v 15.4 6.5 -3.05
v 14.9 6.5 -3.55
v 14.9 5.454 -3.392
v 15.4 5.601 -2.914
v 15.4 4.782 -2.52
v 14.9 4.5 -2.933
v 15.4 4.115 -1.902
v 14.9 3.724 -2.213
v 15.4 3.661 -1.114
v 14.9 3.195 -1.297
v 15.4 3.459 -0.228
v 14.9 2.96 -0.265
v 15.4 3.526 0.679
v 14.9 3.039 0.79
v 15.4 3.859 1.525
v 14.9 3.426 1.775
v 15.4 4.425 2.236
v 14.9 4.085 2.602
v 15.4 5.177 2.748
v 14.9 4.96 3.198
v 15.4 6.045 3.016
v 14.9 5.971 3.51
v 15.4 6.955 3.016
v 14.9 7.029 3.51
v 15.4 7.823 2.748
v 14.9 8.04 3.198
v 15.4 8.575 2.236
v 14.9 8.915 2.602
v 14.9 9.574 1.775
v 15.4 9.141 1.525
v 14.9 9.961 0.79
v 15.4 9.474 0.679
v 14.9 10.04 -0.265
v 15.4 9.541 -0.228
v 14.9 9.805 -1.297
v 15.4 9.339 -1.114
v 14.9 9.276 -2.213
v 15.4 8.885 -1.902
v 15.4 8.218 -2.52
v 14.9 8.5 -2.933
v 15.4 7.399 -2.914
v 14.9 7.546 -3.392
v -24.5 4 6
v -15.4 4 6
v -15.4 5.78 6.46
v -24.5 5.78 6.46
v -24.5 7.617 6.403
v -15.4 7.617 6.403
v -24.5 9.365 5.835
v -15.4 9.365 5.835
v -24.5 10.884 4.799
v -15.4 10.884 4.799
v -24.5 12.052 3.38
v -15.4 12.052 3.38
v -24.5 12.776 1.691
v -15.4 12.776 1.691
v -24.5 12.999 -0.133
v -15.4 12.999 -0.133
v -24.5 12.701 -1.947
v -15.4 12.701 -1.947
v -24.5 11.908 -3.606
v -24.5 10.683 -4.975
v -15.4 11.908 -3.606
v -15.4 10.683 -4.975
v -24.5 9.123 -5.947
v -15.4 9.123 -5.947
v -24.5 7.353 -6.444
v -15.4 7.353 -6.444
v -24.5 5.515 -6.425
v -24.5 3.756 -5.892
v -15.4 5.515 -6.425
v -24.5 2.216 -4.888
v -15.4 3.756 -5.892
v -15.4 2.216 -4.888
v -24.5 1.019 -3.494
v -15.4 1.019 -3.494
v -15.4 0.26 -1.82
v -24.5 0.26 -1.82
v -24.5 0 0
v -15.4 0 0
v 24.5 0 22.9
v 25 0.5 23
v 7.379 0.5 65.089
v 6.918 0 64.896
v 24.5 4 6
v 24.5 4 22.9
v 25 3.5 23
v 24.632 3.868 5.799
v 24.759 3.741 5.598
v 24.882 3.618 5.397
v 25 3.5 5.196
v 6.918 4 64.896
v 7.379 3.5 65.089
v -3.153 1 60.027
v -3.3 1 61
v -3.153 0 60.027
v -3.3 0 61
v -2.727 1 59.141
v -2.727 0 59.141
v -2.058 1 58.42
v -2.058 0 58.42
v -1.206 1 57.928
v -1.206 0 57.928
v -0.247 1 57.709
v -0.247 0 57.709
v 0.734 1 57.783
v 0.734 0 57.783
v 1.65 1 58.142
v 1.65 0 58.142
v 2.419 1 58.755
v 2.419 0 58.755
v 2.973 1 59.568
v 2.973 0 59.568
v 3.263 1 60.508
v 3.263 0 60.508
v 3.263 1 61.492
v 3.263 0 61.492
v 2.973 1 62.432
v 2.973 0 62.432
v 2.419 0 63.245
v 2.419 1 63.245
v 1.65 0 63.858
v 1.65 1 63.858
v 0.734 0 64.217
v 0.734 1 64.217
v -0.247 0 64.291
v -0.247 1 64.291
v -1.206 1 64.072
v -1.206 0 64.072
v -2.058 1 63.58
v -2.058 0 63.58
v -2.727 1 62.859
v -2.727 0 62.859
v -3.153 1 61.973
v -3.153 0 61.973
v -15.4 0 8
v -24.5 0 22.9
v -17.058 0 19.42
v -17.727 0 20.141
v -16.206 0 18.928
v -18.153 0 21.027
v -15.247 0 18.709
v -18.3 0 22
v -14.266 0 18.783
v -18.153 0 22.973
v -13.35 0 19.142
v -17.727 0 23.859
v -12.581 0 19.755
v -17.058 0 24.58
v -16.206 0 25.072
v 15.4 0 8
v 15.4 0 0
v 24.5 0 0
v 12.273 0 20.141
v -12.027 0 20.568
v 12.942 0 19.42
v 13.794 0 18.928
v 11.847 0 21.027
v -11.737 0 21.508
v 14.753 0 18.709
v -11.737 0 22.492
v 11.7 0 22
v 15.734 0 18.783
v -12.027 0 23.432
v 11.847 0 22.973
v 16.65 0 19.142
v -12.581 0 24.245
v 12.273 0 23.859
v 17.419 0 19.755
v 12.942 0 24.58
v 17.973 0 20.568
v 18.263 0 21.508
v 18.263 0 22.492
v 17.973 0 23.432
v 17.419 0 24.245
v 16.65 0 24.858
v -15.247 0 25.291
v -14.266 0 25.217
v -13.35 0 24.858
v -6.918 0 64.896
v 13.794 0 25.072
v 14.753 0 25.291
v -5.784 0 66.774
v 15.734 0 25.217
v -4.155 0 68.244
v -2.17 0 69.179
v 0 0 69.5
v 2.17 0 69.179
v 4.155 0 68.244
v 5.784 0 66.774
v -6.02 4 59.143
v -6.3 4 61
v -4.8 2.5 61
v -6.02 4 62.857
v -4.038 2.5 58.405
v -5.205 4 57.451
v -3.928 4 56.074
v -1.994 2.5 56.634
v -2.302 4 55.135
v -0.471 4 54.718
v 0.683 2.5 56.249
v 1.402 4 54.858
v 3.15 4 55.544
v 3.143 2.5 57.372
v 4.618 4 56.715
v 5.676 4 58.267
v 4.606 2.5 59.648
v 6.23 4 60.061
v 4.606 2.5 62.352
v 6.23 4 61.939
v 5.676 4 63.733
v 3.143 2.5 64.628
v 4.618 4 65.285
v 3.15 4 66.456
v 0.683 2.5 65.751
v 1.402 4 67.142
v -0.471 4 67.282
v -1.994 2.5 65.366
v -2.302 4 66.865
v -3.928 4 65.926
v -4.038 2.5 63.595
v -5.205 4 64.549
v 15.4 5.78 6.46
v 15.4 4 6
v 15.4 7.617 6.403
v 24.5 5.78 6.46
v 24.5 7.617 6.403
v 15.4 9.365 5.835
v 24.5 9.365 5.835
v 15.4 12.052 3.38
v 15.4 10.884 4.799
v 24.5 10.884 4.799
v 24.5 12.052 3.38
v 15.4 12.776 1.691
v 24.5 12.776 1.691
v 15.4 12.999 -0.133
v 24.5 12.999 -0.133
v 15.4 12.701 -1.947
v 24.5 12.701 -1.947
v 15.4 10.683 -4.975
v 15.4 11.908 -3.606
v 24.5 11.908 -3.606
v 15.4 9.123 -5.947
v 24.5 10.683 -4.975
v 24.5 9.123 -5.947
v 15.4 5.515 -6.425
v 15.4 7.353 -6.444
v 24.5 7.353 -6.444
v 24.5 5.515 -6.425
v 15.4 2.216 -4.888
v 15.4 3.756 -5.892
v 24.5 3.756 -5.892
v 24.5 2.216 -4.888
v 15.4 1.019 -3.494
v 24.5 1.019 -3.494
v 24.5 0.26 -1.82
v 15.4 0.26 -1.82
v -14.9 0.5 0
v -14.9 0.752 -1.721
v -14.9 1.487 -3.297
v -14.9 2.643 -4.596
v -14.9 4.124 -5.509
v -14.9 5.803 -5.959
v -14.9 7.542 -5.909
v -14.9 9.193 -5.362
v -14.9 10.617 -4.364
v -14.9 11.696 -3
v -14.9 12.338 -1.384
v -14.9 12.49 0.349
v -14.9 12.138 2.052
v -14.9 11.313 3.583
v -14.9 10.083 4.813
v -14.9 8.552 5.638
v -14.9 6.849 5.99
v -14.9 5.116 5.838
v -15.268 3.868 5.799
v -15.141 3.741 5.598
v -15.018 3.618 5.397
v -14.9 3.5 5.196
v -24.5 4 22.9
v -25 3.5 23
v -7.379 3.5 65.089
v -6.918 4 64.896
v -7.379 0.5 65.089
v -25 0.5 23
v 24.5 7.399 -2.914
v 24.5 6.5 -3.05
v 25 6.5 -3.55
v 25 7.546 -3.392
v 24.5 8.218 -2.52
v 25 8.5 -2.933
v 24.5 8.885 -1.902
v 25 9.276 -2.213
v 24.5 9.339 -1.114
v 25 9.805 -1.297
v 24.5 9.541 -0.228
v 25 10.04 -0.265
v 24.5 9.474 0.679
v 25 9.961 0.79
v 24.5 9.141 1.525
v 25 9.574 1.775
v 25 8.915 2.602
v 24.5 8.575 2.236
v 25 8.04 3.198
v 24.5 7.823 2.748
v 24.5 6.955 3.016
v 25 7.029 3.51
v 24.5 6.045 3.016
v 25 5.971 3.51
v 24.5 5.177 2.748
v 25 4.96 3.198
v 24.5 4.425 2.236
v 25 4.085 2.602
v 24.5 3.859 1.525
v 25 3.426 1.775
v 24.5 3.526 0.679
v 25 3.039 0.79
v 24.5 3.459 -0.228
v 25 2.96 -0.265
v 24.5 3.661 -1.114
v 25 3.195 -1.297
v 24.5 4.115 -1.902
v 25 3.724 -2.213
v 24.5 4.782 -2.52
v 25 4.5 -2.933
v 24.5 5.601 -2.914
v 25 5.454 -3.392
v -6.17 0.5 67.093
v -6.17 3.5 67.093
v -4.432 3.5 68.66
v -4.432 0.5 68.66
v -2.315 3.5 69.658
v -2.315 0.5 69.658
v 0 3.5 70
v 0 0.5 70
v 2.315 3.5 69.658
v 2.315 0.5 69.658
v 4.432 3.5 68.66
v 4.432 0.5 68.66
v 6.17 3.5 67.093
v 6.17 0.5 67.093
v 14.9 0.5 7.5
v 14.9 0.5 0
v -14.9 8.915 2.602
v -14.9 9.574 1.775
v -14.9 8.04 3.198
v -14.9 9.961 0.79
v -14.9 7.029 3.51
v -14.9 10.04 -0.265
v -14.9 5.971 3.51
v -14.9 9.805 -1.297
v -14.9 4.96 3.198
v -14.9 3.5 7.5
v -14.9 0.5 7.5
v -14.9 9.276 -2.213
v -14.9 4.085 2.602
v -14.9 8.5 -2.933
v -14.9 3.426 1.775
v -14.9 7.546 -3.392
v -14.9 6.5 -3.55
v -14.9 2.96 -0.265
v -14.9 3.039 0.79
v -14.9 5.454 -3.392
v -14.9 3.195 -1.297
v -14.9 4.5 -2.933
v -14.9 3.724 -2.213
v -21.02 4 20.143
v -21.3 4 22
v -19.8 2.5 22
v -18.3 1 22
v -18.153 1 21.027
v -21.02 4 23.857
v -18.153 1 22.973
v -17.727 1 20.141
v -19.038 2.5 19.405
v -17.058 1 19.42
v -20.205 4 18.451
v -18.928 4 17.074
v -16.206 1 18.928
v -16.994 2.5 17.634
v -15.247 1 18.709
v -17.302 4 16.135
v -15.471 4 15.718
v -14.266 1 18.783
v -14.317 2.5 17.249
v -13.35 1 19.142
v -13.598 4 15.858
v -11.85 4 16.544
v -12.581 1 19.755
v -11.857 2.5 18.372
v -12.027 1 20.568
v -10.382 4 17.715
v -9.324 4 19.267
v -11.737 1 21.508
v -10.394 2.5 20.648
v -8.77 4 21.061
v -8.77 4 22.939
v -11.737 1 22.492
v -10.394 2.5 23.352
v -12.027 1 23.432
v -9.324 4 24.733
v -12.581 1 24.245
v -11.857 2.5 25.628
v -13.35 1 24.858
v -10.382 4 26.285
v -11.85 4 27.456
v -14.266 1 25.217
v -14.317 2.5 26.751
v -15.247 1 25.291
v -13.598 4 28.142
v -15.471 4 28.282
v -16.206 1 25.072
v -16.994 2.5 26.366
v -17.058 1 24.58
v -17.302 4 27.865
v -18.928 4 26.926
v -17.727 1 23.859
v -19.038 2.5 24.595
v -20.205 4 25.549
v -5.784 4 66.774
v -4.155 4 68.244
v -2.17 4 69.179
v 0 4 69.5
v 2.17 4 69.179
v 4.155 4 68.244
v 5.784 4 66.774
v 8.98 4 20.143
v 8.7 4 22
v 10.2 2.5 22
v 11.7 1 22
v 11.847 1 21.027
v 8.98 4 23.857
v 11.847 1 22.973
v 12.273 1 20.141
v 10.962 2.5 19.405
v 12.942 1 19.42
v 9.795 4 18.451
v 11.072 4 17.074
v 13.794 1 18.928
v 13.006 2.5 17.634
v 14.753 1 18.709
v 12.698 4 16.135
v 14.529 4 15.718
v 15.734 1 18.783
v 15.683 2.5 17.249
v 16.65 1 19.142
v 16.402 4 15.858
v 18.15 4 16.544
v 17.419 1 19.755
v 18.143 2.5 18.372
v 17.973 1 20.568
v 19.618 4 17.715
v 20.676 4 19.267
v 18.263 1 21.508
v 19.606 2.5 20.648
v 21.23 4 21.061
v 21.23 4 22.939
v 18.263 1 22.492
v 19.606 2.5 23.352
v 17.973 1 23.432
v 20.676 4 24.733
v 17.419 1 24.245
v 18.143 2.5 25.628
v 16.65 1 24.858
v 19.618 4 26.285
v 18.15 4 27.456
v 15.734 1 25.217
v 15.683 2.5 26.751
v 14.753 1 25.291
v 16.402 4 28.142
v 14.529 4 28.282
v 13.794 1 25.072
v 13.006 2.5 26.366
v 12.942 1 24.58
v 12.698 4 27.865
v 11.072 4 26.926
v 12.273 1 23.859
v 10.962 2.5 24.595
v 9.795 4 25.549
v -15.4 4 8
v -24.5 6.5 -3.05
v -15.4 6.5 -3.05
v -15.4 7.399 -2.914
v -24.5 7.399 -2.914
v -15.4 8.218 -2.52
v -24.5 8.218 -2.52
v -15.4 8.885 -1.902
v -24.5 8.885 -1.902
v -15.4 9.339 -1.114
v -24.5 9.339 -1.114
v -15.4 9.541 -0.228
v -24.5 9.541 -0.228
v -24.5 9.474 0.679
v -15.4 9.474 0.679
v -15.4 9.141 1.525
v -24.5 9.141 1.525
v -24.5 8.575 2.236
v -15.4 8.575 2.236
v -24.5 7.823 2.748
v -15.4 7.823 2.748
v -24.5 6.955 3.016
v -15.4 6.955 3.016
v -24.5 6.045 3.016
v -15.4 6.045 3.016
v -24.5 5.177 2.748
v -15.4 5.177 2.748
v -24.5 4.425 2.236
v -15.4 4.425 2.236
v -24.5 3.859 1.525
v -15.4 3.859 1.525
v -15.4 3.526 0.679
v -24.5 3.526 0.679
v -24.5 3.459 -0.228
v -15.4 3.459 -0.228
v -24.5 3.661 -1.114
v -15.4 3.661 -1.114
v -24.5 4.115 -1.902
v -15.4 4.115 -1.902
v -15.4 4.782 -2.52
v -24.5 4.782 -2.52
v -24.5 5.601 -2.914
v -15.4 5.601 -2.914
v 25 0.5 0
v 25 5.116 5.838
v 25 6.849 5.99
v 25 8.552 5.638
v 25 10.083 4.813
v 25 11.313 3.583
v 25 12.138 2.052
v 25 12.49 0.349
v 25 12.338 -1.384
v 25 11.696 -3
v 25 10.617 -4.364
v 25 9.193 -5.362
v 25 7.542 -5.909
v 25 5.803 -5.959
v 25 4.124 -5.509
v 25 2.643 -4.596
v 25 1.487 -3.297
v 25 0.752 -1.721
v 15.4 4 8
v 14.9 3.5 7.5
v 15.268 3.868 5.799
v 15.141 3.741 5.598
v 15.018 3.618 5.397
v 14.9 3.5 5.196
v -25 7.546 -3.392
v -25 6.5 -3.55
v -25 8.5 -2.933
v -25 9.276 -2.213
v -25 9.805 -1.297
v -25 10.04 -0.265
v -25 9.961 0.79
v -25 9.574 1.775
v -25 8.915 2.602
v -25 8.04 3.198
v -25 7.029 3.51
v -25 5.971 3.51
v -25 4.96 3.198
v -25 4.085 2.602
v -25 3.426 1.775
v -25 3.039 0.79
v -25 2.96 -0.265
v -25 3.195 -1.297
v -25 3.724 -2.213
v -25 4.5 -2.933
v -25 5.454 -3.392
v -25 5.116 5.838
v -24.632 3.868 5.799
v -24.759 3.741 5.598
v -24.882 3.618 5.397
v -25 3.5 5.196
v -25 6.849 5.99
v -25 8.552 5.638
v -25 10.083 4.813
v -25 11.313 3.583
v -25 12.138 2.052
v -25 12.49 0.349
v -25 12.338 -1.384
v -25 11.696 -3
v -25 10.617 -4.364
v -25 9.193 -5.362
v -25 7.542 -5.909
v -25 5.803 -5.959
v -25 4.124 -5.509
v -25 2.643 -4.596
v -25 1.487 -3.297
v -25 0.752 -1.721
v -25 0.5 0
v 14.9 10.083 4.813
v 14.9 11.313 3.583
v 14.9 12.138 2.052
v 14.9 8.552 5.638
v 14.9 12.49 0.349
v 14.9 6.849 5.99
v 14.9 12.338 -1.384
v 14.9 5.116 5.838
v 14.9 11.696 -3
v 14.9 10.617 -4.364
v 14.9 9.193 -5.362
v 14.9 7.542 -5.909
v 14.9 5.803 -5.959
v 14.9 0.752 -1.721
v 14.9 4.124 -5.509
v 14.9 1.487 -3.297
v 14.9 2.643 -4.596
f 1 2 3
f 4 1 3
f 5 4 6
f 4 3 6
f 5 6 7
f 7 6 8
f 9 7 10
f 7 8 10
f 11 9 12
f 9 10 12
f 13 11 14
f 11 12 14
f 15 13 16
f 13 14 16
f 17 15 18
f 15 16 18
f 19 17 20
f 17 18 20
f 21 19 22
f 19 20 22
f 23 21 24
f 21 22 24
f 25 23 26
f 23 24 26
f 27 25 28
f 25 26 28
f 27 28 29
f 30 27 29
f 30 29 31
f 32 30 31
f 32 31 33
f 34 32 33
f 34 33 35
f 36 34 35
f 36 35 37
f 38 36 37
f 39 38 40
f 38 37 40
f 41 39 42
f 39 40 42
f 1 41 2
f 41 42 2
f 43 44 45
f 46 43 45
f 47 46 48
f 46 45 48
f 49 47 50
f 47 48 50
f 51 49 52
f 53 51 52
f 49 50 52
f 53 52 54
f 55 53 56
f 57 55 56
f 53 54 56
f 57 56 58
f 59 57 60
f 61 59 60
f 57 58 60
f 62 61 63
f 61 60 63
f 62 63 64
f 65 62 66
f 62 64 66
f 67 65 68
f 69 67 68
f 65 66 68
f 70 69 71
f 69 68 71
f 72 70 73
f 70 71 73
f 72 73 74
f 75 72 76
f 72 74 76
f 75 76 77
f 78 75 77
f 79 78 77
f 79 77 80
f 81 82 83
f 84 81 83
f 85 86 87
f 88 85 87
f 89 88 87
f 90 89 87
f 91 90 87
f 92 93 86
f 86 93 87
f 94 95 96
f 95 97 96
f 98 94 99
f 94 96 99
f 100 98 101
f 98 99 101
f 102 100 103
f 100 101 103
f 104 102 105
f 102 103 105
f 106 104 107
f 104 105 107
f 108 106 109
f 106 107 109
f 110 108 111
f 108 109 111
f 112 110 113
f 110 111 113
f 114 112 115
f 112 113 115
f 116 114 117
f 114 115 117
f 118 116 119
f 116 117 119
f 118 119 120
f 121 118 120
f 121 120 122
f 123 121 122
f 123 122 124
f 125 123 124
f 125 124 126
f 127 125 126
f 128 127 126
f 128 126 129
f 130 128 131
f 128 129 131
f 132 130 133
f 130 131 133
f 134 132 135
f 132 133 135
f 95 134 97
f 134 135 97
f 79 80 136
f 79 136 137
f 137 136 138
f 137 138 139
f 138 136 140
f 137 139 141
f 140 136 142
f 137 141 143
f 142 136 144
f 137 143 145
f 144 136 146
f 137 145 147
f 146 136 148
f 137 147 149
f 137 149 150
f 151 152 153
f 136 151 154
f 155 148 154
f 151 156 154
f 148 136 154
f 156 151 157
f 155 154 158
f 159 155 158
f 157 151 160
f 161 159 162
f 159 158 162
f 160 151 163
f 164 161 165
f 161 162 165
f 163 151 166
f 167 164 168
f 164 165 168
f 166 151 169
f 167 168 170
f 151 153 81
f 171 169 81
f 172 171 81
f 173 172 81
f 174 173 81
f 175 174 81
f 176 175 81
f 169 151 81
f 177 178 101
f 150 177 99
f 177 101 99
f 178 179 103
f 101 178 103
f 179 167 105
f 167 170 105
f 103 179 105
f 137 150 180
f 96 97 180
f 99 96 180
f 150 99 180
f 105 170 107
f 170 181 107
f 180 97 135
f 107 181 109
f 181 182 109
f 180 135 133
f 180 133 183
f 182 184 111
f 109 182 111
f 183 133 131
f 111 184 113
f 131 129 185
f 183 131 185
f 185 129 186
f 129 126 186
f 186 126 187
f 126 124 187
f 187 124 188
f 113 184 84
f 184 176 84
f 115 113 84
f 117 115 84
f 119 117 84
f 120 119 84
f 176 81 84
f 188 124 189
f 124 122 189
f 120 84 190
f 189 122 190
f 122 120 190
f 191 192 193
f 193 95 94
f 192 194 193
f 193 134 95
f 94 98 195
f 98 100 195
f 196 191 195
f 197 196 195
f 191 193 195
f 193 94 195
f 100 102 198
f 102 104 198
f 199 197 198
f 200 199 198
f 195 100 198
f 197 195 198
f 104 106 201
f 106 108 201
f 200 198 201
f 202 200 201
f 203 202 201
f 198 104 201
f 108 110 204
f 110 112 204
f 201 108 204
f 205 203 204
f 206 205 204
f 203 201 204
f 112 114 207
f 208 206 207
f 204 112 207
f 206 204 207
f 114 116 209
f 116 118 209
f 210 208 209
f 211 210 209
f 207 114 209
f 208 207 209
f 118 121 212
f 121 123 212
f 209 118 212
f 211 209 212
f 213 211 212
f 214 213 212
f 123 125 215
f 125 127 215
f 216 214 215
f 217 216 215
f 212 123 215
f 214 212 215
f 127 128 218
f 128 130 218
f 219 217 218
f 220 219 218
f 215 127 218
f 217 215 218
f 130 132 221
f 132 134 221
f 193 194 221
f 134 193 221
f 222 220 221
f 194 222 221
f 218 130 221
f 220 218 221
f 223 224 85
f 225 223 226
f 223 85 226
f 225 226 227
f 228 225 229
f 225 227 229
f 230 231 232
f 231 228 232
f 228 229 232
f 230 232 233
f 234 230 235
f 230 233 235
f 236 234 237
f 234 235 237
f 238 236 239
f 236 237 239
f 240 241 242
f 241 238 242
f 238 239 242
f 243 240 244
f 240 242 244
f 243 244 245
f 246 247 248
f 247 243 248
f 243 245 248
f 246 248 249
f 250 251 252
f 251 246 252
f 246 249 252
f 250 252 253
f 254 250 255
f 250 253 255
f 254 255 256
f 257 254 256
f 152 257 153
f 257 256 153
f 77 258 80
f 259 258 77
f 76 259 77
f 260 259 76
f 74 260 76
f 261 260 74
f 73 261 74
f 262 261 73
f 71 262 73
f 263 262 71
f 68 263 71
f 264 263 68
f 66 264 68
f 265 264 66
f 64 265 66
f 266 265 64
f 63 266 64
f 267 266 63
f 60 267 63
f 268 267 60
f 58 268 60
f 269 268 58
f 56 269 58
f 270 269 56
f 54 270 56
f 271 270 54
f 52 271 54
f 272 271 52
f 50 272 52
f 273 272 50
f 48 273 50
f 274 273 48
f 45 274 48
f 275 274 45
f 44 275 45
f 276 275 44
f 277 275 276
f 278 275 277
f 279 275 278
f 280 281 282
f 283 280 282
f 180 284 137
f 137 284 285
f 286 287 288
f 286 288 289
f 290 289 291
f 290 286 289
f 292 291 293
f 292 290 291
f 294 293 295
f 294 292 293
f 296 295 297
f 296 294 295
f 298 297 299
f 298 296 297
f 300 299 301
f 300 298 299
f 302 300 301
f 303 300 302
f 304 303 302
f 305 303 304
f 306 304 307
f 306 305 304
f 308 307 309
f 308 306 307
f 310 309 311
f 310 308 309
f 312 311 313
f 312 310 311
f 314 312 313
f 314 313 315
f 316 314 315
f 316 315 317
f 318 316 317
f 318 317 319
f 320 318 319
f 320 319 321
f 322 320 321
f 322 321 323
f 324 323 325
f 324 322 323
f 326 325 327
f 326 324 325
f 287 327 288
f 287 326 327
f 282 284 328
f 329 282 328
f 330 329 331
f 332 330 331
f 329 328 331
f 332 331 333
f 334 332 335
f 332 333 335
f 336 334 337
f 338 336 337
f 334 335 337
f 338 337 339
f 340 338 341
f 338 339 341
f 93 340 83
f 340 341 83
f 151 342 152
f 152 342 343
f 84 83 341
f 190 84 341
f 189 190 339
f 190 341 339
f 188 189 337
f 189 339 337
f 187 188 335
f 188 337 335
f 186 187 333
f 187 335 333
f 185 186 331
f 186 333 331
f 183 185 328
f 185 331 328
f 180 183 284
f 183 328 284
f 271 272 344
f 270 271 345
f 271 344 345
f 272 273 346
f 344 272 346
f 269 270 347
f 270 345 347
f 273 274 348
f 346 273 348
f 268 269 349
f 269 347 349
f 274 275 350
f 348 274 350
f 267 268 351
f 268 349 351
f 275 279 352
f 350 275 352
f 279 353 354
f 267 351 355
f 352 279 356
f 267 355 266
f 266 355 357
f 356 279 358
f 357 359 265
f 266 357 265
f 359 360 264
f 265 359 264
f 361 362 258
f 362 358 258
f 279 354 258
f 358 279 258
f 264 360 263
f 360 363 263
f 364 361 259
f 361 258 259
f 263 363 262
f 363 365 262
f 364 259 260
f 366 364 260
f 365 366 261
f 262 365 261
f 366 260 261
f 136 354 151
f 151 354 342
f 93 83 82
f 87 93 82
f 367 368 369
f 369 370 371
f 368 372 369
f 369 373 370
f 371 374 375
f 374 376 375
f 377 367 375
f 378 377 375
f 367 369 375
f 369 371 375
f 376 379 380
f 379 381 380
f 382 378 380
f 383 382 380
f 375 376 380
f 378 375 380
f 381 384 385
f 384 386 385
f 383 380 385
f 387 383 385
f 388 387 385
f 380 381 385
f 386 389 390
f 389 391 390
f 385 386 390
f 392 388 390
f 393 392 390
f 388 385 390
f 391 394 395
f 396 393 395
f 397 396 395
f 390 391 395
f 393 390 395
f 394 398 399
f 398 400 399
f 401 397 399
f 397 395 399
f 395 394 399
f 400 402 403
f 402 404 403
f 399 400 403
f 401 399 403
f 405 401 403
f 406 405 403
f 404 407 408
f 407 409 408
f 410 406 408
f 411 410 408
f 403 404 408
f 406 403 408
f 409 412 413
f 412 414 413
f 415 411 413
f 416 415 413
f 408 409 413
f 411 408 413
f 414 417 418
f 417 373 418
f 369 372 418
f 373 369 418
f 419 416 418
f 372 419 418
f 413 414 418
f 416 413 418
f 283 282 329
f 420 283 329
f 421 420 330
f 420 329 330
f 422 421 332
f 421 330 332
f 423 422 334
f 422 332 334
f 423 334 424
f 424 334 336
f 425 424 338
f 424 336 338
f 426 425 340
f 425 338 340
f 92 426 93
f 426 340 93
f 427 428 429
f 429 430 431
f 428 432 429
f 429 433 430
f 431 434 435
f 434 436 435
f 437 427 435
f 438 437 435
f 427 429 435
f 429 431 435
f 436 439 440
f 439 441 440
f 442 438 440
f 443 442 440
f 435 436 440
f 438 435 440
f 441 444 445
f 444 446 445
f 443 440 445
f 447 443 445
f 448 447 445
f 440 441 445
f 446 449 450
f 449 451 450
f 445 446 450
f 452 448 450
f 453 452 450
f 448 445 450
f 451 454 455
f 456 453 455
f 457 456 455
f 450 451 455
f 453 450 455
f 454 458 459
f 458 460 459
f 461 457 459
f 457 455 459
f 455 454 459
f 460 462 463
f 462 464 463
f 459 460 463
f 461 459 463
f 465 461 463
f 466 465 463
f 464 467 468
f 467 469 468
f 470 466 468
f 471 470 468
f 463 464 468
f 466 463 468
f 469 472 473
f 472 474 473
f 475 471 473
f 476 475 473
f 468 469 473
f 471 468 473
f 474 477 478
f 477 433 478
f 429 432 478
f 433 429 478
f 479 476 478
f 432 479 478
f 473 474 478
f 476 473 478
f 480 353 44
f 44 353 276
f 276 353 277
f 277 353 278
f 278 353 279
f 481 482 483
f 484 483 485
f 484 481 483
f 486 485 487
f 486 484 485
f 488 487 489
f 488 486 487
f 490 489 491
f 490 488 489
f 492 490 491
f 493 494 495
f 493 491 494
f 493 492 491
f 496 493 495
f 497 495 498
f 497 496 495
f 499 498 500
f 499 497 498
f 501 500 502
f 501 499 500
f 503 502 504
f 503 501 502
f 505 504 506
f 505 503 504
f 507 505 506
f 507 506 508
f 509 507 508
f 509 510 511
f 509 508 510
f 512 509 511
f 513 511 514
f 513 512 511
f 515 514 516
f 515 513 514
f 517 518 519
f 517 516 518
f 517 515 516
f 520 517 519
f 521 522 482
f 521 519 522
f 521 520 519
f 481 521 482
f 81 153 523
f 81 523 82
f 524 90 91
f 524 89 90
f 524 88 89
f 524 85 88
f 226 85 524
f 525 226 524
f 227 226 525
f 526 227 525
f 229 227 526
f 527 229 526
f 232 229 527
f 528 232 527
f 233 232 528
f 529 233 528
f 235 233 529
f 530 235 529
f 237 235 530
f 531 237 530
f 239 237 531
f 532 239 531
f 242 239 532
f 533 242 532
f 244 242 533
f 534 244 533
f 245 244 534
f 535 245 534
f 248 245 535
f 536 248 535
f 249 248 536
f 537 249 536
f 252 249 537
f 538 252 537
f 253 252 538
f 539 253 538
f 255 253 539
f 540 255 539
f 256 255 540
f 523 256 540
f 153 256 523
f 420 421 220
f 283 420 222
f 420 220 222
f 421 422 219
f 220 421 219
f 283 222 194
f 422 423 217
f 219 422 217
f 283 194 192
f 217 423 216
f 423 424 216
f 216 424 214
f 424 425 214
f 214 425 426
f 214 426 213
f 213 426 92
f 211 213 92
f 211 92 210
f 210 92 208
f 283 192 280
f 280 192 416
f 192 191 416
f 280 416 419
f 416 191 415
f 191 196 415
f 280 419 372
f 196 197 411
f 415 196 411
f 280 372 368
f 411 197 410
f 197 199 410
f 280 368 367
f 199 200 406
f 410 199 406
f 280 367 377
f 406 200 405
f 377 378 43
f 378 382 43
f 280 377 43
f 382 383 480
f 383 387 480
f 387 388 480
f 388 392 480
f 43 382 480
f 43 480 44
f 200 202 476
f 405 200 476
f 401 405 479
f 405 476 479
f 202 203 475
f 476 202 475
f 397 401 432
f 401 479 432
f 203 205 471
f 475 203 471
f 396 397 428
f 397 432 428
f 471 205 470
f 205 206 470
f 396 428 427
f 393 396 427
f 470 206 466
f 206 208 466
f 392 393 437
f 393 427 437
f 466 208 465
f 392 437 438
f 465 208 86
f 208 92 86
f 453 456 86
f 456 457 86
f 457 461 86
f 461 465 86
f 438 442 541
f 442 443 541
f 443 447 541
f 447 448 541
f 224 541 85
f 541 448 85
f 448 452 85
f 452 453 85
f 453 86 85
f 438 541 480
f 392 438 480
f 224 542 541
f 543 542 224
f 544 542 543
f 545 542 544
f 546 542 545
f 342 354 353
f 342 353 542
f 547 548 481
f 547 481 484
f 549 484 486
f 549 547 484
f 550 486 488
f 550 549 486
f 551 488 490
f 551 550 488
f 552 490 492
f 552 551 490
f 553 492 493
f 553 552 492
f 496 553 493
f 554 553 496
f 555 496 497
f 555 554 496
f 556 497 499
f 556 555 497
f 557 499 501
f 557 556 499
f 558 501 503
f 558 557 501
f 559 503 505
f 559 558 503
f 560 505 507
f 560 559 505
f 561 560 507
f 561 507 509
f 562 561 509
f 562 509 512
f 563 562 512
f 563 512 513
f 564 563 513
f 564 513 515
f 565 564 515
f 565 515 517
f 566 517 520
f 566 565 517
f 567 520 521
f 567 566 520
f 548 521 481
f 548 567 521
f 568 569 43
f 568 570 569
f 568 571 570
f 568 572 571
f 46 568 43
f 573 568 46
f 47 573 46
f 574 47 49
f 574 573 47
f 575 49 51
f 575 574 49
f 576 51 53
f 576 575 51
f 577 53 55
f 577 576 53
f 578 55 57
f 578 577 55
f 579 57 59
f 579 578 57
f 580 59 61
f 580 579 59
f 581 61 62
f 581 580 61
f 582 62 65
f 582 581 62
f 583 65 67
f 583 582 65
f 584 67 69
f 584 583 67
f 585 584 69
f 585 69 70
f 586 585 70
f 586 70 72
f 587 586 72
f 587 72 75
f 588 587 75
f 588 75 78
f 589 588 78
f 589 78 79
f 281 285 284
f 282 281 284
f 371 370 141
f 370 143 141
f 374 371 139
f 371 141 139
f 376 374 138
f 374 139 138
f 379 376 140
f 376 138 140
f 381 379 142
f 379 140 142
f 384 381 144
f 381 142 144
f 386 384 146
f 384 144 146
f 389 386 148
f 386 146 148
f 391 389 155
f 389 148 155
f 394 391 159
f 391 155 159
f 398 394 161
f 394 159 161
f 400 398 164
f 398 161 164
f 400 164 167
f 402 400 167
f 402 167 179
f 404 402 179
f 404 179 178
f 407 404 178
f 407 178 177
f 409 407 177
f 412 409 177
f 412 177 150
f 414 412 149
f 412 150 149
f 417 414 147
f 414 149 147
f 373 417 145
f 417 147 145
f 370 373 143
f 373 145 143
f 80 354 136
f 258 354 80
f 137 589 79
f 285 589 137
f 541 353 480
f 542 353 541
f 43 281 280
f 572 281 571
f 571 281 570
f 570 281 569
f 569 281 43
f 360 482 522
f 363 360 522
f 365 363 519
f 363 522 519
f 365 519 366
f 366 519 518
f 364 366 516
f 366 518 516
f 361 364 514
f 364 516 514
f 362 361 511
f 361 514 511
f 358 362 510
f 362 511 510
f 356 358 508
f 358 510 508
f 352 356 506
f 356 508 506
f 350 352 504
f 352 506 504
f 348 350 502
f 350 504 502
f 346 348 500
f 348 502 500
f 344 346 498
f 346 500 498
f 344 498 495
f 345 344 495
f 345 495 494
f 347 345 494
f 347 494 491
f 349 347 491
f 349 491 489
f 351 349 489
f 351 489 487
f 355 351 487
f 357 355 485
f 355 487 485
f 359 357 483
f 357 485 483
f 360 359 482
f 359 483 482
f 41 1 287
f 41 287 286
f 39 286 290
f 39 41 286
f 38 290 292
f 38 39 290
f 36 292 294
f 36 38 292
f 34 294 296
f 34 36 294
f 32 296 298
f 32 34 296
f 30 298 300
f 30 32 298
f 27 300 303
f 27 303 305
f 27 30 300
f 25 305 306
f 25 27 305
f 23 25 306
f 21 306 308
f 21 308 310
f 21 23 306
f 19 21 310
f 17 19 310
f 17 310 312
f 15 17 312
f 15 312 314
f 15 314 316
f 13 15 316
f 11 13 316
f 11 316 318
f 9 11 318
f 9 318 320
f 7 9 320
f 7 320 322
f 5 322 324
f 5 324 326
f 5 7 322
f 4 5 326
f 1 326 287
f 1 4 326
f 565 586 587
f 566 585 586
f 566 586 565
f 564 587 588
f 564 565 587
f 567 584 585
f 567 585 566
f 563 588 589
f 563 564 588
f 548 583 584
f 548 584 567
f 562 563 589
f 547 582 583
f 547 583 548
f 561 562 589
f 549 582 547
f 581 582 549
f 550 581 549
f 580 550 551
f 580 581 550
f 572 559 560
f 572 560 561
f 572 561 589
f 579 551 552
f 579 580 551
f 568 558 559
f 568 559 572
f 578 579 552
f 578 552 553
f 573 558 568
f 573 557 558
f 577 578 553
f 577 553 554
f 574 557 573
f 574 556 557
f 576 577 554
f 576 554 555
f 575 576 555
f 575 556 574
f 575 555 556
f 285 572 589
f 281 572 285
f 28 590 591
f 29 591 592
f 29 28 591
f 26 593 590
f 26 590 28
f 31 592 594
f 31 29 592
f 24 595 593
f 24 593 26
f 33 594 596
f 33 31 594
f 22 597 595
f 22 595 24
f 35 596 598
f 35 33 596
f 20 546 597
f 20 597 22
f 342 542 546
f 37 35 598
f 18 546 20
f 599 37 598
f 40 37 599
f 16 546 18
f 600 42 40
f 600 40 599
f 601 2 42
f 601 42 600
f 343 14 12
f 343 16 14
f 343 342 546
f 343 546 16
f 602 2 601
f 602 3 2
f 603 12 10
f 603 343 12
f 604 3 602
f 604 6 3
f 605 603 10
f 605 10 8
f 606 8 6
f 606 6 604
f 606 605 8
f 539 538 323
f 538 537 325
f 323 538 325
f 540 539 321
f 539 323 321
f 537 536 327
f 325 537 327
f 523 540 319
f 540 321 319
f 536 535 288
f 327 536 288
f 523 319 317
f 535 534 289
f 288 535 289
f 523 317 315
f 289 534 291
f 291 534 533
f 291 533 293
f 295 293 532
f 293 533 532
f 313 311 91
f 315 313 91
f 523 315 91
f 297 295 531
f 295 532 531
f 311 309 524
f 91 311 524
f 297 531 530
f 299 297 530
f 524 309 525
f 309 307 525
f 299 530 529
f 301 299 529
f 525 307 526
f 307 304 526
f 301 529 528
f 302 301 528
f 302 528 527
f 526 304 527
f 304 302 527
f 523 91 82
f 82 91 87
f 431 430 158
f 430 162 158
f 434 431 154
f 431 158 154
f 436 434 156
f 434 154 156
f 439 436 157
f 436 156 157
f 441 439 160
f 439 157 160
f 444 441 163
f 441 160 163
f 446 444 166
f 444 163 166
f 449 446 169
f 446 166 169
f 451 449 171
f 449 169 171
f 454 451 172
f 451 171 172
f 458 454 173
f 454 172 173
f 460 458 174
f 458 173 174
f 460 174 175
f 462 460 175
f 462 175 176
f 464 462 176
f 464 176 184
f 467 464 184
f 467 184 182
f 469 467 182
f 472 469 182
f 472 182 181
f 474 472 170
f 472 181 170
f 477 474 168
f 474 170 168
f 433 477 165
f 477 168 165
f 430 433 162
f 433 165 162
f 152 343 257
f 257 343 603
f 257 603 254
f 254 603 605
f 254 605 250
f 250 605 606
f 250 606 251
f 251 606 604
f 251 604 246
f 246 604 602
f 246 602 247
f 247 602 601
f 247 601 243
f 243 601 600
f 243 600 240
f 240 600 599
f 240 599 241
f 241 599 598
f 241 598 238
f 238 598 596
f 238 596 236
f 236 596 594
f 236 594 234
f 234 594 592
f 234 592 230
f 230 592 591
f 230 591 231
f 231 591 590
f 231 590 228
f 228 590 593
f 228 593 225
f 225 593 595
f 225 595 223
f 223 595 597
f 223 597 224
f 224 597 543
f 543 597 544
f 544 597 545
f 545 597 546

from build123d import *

# Parameters (mm, degrees)
SKETCH1_R                                       = 3.05
BOSS_EXTRUDE1_DEPTH                             = 25
SKETCH2_W                                       = 29.8
SKETCH2_H                                       = 20
CUT_EXTRUDE1_DEPTH                              = 76.45859792
CSK_FOR_M6_FLAT_HEAD_MACHINE_SCREW1_D           = 6.6
CSK_FOR_M6_FLAT_HEAD_MACHINE_SCREW1_DEPTH       = 38.017159957
CSK_FOR_M6_FLAT_HEAD_MACHINE_SCREW1_CSINK_D     = 12.6
CSK_FOR_M6_FLAT_HEAD_MACHINE_SCREW1_CSINK_ANGLE = 90
CSK_FOR_M6_FLAT_HEAD_MACHINE_SCREW1_TIP         = 1.982840043
CHAMFER1_SIZE                                   = 0.5
CHAMFER2_SIZE                                   = 0.5


with BuildPart() as part:
    # Sketch1 → Boss-Extrude1 (new, symmetric)
    with BuildSketch(Plane(origin=(0, 0, 0), x_dir=(0, 0, -1), z_dir=(1, 0, 0))):
        with BuildLine():
            Line((0, 0), (-70, 0))
            Line((-70, 0), (-70, 4))
            Line((-70, 4), (-6, 4))
            ThreePointArc((-6, 4), (3.605551275, 11.908326913), (0, 0))
        make_face()
        with Locations((0, 6.5)):
            Circle(SKETCH1_R, mode=Mode.SUBTRACT)
    extrude(amount=BOSS_EXTRUDE1_DEPTH, both=True)

    # Sketch2 → Cut-Extrude1 (cut, through all)
    with BuildSketch(Plane(origin=(0, 0, 0), x_dir=(1, 0, 0), z_dir=(0, 1, 0))):
        with Locations((0, 2.5)):
            Rectangle(SKETCH2_W, SKETCH2_H)
        with BuildLine():
            Line((-25, -23), (-7.379416922, -65.089369822))
            ThreePointArc((-7.379416922, -65.089369822), (0, -70), (7.379416922, -65.089369822))
            Line((7.379416922, -65.089369822), (25, -23))
            Line((25, -23), (25, -80))
            Line((25, -80), (-25, -80))
            Line((-25, -80), (-25, -23))
        make_face()
    extrude(amount=CUT_EXTRUDE1_DEPTH, mode=Mode.SUBTRACT)

    # CSK for M6 Flat Head Machine Screw1
    with Locations(Plane(origin=(0, 4, 0), x_dir=(1, 0, 0), z_dir=(0, 1, 0))):
        with Locations((15, -22), (-15, -22), (0, -61)):
            CounterSinkHole(CSK_FOR_M6_FLAT_HEAD_MACHINE_SCREW1_D / 2, CSK_FOR_M6_FLAT_HEAD_MACHINE_SCREW1_CSINK_D / 2, depth=CSK_FOR_M6_FLAT_HEAD_MACHINE_SCREW1_DEPTH, counter_sink_angle=CSK_FOR_M6_FLAT_HEAD_MACHINE_SCREW1_CSINK_ANGLE)
            with Locations((0, 0, -(CSK_FOR_M6_FLAT_HEAD_MACHINE_SCREW1_DEPTH + CSK_FOR_M6_FLAT_HEAD_MACHINE_SCREW1_TIP / 2))):  # 118° drill point
                Cone(0, CSK_FOR_M6_FLAT_HEAD_MACHINE_SCREW1_D / 2, CSK_FOR_M6_FLAT_HEAD_MACHINE_SCREW1_TIP, mode=Mode.SUBTRACT)

    # Chamfer1
    chamfer1_edges = [part.edges().sort_by_distance(p)[0] for p in [
        (-25, 6.5, 3.05),
        (25, 6.5, 3.05),
        (-14.9, 6.5, 3.05),
        (14.9, 6.5, 3.05),
    ]]
    chamfer(chamfer1_edges, length=CHAMFER1_SIZE)

    # Chamfer2
    chamfer2_edges = [part.edges().sort_by_distance(p)[0] for p in [
        (-25, 0, 11.5),
        (25, 0, 11.5),
        (0, 0, 70),
        (0, 0, 7.5),
        (-14.9, 0, 3.75),
        (-14.9, 11.908326913, -3.605551275),
        (14.9, 0, 3.75),
        (14.9, 11.908326913, -3.605551275),
        (-14.9, 4, 6.75),
        (0, 4, 7.5),
        (14.9, 4, 6.75),
        (16.189708461, 0, 44.044684911),
        (-16.189708461, 0, 44.044684911),
        (16.189708461, 4, 44.044684911),
        (25, 11.908326913, -3.605551275),
        (0, 4, 70),
        (-16.189708461, 4, 44.044684911),
        (-25, 4, 14.5),
        (-25, 11.908326913, -3.605551275),
        (25, 4, 14.5),
    ]]
    chamfer(chamfer2_edges, length=CHAMFER2_SIZE)


solid = part.part
